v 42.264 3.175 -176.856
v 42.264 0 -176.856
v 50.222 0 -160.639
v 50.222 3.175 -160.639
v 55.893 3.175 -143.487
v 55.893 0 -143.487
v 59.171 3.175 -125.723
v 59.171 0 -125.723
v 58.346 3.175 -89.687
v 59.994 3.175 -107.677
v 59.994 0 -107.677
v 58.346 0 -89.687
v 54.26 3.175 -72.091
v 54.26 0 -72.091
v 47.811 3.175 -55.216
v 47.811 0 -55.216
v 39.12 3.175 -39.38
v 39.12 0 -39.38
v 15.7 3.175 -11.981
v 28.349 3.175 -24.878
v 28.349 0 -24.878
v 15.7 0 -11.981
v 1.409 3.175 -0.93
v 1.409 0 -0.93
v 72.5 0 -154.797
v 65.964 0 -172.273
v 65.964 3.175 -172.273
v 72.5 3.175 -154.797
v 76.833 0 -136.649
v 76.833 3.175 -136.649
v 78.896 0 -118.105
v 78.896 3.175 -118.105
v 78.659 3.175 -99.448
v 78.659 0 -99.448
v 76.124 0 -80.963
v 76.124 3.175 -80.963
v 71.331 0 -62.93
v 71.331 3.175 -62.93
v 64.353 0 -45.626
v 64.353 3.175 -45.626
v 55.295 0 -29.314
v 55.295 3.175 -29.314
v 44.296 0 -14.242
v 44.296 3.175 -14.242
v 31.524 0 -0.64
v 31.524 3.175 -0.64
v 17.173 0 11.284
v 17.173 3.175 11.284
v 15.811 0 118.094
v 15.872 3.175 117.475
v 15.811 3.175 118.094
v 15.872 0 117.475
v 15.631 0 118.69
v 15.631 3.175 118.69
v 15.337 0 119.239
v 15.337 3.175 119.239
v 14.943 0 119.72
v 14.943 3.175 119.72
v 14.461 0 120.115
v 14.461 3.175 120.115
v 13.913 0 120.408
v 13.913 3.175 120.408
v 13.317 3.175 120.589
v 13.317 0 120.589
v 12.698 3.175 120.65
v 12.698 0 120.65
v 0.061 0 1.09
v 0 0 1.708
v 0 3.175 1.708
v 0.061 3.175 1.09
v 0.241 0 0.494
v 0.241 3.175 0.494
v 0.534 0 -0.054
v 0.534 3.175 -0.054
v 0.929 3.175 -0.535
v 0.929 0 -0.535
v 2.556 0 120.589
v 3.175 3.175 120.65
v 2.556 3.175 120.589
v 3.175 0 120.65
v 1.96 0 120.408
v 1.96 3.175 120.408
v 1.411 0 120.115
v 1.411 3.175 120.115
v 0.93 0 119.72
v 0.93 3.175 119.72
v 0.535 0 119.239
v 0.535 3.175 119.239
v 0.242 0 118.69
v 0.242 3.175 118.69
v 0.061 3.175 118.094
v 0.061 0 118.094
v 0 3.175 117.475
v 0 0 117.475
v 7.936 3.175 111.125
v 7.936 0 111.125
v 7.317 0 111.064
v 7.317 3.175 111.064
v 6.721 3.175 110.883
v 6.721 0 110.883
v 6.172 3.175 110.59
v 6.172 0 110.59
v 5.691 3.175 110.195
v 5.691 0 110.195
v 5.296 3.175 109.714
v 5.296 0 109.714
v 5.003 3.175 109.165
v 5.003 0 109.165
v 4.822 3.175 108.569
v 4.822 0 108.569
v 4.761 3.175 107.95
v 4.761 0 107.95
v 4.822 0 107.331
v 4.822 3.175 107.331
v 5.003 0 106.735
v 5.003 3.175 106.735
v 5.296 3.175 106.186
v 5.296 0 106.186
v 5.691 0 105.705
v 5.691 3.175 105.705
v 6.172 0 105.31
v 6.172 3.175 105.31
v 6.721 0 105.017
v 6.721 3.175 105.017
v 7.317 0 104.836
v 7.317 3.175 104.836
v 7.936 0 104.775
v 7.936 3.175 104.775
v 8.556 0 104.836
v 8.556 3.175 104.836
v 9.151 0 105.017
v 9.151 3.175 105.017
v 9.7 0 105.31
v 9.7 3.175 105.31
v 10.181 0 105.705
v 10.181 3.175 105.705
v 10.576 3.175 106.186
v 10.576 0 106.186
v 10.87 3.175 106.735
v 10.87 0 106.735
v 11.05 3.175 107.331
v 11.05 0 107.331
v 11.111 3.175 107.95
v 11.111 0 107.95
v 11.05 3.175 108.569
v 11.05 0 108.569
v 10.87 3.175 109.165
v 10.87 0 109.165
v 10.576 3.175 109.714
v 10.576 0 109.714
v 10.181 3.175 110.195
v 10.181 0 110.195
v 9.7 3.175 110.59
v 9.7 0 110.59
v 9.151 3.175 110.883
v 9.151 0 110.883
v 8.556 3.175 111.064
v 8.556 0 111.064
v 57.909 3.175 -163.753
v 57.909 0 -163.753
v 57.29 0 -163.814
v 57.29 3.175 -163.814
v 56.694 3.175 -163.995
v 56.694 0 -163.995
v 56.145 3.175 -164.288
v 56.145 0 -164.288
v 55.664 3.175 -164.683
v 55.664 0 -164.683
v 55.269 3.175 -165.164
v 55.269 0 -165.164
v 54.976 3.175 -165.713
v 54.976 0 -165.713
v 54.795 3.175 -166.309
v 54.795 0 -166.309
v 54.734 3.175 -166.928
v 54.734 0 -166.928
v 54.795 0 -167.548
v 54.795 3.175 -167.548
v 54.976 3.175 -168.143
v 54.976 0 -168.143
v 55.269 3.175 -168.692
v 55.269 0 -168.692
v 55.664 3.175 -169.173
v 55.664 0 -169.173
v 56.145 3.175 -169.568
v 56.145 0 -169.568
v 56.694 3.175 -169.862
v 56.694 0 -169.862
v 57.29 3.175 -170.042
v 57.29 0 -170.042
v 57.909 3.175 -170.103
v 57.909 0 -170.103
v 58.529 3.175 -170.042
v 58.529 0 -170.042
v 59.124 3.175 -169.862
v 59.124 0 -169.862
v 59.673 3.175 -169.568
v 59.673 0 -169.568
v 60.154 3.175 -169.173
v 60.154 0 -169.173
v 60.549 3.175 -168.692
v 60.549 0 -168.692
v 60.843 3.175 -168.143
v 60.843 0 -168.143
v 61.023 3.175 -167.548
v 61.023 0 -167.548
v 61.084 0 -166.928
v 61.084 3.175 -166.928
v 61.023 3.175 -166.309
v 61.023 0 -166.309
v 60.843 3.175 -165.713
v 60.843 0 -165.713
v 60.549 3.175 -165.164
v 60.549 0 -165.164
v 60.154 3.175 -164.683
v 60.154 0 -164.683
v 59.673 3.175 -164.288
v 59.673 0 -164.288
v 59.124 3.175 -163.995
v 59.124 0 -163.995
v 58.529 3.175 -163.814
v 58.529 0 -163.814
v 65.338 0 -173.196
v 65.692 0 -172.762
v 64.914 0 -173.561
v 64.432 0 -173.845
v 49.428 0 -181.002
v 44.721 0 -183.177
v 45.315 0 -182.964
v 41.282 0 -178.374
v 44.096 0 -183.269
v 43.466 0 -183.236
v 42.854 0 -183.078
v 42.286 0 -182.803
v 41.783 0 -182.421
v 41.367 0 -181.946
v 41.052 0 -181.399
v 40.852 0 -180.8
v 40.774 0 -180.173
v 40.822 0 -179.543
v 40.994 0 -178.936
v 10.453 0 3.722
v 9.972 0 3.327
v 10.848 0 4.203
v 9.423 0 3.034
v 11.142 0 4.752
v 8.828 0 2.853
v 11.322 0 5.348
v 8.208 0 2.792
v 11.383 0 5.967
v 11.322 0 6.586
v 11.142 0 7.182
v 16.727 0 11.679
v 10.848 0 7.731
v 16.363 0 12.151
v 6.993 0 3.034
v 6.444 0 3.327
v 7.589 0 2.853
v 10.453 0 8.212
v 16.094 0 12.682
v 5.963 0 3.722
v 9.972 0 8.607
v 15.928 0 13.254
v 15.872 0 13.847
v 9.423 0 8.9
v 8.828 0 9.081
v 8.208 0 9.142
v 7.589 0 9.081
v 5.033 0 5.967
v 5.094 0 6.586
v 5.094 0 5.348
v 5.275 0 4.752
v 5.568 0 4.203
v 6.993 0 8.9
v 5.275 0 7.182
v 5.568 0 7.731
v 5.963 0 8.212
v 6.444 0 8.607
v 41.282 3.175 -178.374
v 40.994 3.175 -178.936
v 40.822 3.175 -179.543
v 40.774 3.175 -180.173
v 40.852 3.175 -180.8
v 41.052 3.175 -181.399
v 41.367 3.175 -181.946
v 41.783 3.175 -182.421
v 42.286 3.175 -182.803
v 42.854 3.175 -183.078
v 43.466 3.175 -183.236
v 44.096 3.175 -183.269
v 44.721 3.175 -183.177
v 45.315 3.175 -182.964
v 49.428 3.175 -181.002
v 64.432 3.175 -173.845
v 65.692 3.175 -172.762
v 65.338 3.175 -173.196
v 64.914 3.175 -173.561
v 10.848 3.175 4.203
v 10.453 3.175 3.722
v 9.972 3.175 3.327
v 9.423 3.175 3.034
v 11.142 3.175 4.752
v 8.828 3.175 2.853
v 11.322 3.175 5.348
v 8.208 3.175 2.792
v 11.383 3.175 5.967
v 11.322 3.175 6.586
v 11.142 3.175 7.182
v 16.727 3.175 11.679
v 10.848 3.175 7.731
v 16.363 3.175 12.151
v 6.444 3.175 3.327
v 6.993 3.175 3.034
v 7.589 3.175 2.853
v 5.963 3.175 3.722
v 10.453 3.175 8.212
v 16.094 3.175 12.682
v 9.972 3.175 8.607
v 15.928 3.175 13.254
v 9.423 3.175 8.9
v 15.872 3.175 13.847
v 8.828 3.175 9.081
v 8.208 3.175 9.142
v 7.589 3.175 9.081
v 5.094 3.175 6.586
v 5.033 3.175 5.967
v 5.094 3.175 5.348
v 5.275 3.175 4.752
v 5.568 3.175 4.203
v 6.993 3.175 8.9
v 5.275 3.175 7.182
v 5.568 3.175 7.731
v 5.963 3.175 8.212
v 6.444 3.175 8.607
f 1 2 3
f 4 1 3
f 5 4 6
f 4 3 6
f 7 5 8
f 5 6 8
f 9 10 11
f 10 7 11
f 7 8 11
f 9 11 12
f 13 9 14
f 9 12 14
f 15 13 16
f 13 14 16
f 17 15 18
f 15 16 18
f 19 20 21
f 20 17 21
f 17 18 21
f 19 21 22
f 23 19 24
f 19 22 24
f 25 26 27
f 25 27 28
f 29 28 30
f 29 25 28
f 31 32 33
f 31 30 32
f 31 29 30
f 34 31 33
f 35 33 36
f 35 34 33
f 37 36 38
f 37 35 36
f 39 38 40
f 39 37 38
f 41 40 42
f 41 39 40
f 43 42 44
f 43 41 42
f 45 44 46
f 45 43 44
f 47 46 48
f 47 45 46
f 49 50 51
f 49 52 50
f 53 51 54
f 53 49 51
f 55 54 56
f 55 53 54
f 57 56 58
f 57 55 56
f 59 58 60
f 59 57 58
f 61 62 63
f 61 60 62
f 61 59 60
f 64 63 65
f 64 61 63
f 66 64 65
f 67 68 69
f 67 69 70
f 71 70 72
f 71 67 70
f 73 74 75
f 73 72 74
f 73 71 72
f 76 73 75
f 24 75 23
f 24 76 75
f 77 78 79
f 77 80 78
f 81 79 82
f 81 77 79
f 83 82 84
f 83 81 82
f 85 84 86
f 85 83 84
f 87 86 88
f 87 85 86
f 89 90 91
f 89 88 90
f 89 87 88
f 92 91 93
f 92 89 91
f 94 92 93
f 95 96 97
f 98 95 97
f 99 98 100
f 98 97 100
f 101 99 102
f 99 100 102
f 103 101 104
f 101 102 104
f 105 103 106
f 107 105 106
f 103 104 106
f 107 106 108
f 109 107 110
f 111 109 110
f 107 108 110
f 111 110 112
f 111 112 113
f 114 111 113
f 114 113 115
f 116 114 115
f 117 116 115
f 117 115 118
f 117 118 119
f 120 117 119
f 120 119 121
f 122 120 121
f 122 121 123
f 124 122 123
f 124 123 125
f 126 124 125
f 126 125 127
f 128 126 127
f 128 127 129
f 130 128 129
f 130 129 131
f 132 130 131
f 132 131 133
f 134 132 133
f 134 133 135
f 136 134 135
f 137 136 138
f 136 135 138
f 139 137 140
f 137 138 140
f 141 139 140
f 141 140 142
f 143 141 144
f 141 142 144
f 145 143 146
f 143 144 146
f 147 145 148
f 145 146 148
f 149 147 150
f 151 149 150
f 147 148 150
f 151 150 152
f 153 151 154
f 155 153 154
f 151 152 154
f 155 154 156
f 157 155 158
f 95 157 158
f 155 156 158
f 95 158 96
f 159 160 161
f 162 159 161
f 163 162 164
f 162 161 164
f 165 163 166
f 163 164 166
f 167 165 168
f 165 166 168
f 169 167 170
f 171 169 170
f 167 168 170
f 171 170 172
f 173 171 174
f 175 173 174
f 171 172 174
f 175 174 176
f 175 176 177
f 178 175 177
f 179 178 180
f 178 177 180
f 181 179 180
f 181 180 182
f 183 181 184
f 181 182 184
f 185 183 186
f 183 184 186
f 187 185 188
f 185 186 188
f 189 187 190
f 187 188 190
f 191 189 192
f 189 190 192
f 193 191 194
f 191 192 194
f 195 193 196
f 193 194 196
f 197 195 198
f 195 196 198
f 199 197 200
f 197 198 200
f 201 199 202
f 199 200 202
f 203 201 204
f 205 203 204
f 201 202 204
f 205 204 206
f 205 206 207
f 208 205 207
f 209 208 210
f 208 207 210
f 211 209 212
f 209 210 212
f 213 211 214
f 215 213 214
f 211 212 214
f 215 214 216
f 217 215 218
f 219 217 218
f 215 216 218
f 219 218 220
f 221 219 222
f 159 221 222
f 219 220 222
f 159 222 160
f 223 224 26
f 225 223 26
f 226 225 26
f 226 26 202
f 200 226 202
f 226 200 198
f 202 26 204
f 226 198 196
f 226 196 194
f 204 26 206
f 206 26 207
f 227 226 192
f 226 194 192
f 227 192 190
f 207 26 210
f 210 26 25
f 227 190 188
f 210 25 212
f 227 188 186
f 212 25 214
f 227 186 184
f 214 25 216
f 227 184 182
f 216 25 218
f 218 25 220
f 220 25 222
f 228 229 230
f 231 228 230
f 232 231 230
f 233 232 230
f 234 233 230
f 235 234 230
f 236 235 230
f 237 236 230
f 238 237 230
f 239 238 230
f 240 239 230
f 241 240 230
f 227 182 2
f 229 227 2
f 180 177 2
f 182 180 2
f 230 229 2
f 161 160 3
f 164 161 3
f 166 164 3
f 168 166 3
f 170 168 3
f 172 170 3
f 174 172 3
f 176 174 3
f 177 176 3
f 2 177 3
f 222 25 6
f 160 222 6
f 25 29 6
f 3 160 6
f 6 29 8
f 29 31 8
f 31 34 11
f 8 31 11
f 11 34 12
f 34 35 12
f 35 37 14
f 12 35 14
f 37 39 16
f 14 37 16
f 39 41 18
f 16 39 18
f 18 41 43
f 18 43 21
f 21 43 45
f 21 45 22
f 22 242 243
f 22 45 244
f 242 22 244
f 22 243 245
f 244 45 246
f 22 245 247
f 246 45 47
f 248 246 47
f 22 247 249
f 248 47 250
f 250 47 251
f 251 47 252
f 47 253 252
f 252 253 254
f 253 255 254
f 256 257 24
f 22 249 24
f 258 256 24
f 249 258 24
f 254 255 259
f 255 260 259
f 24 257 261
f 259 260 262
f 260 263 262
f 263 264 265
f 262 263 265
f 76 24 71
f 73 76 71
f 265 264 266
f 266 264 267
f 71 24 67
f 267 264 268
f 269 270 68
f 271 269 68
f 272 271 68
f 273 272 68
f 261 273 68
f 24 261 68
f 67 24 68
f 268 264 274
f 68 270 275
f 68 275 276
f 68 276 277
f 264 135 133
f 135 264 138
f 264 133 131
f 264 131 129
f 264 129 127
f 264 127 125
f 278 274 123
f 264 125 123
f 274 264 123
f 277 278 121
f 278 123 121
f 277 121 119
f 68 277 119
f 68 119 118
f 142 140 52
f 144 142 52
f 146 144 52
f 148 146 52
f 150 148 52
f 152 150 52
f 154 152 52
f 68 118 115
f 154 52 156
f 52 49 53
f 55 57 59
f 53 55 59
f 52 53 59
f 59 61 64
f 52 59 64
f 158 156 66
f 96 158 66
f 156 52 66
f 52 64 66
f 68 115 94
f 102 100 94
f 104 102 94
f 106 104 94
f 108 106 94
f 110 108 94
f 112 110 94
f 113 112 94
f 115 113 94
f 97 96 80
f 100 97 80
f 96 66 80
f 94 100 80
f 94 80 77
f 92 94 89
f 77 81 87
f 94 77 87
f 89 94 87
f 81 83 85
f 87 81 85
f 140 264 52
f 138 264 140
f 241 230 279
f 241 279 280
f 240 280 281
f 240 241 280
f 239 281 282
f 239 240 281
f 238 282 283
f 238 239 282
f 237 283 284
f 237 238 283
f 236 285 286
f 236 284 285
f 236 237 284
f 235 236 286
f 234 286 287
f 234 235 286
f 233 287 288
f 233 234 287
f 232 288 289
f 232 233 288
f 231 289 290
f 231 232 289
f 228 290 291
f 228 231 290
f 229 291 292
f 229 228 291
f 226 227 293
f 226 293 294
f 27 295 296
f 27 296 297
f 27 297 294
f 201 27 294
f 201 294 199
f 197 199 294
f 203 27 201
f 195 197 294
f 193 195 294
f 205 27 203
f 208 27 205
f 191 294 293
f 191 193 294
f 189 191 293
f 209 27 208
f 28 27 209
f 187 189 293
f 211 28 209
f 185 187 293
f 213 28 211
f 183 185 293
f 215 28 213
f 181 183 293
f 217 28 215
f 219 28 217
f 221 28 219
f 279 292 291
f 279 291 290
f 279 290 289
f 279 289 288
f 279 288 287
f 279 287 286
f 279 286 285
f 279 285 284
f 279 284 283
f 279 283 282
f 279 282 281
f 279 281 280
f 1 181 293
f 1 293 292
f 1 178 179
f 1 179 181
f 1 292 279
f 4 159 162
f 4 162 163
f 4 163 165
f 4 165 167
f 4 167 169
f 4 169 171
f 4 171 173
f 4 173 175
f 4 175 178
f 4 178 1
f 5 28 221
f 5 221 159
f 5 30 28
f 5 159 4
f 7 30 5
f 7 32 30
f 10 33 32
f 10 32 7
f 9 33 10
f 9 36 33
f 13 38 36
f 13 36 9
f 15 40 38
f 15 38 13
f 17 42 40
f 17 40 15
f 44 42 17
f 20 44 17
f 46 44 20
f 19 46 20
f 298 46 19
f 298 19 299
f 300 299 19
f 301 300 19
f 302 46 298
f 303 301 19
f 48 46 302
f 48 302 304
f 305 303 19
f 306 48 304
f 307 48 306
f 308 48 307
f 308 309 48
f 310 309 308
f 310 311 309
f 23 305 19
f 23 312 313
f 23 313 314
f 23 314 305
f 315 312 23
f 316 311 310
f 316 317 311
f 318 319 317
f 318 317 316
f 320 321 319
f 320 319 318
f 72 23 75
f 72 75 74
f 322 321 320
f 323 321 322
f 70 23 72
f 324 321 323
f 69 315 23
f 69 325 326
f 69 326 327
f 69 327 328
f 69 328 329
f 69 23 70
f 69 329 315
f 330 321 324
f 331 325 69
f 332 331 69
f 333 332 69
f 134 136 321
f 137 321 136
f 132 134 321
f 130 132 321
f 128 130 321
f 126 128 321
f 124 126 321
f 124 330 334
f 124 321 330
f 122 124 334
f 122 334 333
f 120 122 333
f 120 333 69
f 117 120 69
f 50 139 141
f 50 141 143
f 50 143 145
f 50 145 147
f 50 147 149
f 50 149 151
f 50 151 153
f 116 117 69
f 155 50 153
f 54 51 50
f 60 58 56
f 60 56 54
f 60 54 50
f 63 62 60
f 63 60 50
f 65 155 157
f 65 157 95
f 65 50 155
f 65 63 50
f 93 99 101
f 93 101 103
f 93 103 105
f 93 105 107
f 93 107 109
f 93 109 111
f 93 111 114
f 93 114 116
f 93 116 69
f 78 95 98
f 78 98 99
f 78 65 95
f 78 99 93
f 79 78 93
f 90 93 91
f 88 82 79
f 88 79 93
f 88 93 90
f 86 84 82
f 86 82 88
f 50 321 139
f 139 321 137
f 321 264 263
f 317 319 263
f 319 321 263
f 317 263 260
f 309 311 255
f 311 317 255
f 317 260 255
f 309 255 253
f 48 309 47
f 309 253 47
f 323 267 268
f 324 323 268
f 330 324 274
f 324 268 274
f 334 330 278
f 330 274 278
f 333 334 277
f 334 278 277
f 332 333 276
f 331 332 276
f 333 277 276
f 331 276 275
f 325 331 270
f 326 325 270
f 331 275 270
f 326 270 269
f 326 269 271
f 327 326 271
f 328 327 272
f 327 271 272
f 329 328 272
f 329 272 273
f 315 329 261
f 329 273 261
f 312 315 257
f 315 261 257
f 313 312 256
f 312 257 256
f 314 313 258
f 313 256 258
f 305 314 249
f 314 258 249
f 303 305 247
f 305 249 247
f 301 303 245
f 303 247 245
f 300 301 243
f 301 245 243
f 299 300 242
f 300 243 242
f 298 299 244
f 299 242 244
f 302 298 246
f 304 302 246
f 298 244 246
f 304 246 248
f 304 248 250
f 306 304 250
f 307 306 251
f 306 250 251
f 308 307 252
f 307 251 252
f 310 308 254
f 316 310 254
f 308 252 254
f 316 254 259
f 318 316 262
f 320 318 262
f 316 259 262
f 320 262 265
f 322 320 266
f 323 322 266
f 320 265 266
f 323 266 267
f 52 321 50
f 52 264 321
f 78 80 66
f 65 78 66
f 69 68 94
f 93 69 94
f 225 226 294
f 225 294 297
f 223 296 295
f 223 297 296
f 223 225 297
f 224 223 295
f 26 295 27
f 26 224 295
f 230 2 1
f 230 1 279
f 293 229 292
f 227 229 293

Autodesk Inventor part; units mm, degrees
ref_plane "YZ Plane" through (0, 0, 0) normal (1, 0, 0) x (0, 1, 0)
ref_plane "XZ Plane" through (0, 0, 0) normal (0, 1, 0) x (-1, 0, 0)
ref_plane "XY Plane" through (0, 0, 0) normal (0, 0, 1) x (1, 0, 0)
sketch "Sketch1" plane through (0, 0, 0) normal (0, 1, 0) x (-1, 0, 0)
  line L0 (0, 0) -> (72.0519, -110.6962) construction
  line L1 (0, 0) -> (0, -132.08) construction
  arc A0 (-1.4091, -0.9301) -> (-42.2635, -176.856) centre (72.0519, -110.6962) ccw
  line L2 (72.0519, -110.6962) -> (-42.2635, -176.856) construction
  arc A1 (0, 22.1526) -> (-15.8725, 12.2248) centre (72.0519, -110.6962) ccw construction
  line L3 (0, 0) -> (-15.9623, 24.5235) construction
  line L4 (0, 1.7085) -> (0, 117.475)
  line L5 (-15.8725, 13.8467) -> (-15.8725, 117.475)
  line L6 (-3.175, 120.65) -> (-12.6975, 120.65)
  line L7 (-49.4275, -181.0021) -> (-64.4319, -173.8454)
  arc A2 (-17.173, 11.2841) -> (-65.9645, -172.2733) centre (72.0519, -110.6962) ccw
  line L8 (-42.2635, -176.856) -> (-41.282, -178.374)
  line L9 (-45.3151, -182.9636) -> (-49.4275, -181.0021)
  arc A3 (-45.3151, -182.9636) -> (-41.282, -178.374) centre (-43.9482, -180.0979) ccw
  arc A4 (-65.9645, -172.2733) -> (-64.4319, -173.8454) centre (-63.065, -170.9797) ccw
  arc A5 (-1.4091, -0.9301) -> (0, 1.7085) centre (-3.175, 1.7085) ccw
  arc A6 (-17.173, 11.2841) -> (-15.8725, 13.8467) centre (-19.0475, 13.8467) ccw
  arc A7 (0, 117.475) -> (-3.175, 120.65) centre (-3.175, 117.475) ccw
  arc A8 (-12.6975, 120.65) -> (-15.8725, 117.475) centre (-12.6975, 117.475) ccw
  point P0 (-65.4815, -173.3448)
  point P1 (0, 120.65)
  point P2 (-35.1928, -187.7917)
  dimension "d1" = 132.08
  dimension "d2" = 33.06
  dimension "d3" = 87
  dimension "d4" = 302.26
  dimension "d5" = 29.2608
  dimension "d6" = 120.65
  dimension "d8" = 3.175
  dimension "d9" = 3.175
  dimension "d10" = 3.175
extrude "Extrusion1" add sketch "Sketch1" along normal blind 3.175
sketch "Sketch2" plane through (0, 3.175, 0) normal (0, 1, 0) x (1, 0, 0)
  arc A0 (17.173, -11.2841) -> (65.9645, 172.2733) centre (-72.0519, 110.6962) ccw projected
  line L0 (45.6255, 15.8684) -> (-72.0519, 110.6962)
  circle A1 centre (-72.0519, 110.6962) radius 151.13
  circle A2 centre (-72.0519, 110.6962) radius 132.0211
  circle A3 centre (-72.0519, 110.6962) radius 141.605
  circle A4 centre (57.9094, 166.9283) radius 3.175
  arc A5 (17.173, -11.2841) -> (15.8725, -13.8467) centre (19.0475, -13.8467) ccw projected
  line L1 (0, 0) -> (19.0475, -13.8467)
  circle A6 centre (8.2082, -5.967) radius 3.175
  line L2 (3.175, -120.65) -> (12.6975, -120.65) projected
  line L3 (7.9363, -120.65) -> (7.9363, 5.6655)
  circle A7 centre (7.9363, -107.95) radius 3.175
  dimension "d13" = 283.21
  dimension "d14" = 6.35
  dimension "d15" = 6.35
  dimension "d16" = 6.35
  dimension "d17" = 12.7
hole "Hole1" at (7.9363, 3.175, 107.95) at (8.2082, 3.175, 5.967) at (57.9094, 3.175, -166.9283) direction (0, -1, 0) diameter 6.35 depth 25.4 tip angle 118
properties part number "2AM-17-P-5201 - claw arm" material "Aluminum 6061"
